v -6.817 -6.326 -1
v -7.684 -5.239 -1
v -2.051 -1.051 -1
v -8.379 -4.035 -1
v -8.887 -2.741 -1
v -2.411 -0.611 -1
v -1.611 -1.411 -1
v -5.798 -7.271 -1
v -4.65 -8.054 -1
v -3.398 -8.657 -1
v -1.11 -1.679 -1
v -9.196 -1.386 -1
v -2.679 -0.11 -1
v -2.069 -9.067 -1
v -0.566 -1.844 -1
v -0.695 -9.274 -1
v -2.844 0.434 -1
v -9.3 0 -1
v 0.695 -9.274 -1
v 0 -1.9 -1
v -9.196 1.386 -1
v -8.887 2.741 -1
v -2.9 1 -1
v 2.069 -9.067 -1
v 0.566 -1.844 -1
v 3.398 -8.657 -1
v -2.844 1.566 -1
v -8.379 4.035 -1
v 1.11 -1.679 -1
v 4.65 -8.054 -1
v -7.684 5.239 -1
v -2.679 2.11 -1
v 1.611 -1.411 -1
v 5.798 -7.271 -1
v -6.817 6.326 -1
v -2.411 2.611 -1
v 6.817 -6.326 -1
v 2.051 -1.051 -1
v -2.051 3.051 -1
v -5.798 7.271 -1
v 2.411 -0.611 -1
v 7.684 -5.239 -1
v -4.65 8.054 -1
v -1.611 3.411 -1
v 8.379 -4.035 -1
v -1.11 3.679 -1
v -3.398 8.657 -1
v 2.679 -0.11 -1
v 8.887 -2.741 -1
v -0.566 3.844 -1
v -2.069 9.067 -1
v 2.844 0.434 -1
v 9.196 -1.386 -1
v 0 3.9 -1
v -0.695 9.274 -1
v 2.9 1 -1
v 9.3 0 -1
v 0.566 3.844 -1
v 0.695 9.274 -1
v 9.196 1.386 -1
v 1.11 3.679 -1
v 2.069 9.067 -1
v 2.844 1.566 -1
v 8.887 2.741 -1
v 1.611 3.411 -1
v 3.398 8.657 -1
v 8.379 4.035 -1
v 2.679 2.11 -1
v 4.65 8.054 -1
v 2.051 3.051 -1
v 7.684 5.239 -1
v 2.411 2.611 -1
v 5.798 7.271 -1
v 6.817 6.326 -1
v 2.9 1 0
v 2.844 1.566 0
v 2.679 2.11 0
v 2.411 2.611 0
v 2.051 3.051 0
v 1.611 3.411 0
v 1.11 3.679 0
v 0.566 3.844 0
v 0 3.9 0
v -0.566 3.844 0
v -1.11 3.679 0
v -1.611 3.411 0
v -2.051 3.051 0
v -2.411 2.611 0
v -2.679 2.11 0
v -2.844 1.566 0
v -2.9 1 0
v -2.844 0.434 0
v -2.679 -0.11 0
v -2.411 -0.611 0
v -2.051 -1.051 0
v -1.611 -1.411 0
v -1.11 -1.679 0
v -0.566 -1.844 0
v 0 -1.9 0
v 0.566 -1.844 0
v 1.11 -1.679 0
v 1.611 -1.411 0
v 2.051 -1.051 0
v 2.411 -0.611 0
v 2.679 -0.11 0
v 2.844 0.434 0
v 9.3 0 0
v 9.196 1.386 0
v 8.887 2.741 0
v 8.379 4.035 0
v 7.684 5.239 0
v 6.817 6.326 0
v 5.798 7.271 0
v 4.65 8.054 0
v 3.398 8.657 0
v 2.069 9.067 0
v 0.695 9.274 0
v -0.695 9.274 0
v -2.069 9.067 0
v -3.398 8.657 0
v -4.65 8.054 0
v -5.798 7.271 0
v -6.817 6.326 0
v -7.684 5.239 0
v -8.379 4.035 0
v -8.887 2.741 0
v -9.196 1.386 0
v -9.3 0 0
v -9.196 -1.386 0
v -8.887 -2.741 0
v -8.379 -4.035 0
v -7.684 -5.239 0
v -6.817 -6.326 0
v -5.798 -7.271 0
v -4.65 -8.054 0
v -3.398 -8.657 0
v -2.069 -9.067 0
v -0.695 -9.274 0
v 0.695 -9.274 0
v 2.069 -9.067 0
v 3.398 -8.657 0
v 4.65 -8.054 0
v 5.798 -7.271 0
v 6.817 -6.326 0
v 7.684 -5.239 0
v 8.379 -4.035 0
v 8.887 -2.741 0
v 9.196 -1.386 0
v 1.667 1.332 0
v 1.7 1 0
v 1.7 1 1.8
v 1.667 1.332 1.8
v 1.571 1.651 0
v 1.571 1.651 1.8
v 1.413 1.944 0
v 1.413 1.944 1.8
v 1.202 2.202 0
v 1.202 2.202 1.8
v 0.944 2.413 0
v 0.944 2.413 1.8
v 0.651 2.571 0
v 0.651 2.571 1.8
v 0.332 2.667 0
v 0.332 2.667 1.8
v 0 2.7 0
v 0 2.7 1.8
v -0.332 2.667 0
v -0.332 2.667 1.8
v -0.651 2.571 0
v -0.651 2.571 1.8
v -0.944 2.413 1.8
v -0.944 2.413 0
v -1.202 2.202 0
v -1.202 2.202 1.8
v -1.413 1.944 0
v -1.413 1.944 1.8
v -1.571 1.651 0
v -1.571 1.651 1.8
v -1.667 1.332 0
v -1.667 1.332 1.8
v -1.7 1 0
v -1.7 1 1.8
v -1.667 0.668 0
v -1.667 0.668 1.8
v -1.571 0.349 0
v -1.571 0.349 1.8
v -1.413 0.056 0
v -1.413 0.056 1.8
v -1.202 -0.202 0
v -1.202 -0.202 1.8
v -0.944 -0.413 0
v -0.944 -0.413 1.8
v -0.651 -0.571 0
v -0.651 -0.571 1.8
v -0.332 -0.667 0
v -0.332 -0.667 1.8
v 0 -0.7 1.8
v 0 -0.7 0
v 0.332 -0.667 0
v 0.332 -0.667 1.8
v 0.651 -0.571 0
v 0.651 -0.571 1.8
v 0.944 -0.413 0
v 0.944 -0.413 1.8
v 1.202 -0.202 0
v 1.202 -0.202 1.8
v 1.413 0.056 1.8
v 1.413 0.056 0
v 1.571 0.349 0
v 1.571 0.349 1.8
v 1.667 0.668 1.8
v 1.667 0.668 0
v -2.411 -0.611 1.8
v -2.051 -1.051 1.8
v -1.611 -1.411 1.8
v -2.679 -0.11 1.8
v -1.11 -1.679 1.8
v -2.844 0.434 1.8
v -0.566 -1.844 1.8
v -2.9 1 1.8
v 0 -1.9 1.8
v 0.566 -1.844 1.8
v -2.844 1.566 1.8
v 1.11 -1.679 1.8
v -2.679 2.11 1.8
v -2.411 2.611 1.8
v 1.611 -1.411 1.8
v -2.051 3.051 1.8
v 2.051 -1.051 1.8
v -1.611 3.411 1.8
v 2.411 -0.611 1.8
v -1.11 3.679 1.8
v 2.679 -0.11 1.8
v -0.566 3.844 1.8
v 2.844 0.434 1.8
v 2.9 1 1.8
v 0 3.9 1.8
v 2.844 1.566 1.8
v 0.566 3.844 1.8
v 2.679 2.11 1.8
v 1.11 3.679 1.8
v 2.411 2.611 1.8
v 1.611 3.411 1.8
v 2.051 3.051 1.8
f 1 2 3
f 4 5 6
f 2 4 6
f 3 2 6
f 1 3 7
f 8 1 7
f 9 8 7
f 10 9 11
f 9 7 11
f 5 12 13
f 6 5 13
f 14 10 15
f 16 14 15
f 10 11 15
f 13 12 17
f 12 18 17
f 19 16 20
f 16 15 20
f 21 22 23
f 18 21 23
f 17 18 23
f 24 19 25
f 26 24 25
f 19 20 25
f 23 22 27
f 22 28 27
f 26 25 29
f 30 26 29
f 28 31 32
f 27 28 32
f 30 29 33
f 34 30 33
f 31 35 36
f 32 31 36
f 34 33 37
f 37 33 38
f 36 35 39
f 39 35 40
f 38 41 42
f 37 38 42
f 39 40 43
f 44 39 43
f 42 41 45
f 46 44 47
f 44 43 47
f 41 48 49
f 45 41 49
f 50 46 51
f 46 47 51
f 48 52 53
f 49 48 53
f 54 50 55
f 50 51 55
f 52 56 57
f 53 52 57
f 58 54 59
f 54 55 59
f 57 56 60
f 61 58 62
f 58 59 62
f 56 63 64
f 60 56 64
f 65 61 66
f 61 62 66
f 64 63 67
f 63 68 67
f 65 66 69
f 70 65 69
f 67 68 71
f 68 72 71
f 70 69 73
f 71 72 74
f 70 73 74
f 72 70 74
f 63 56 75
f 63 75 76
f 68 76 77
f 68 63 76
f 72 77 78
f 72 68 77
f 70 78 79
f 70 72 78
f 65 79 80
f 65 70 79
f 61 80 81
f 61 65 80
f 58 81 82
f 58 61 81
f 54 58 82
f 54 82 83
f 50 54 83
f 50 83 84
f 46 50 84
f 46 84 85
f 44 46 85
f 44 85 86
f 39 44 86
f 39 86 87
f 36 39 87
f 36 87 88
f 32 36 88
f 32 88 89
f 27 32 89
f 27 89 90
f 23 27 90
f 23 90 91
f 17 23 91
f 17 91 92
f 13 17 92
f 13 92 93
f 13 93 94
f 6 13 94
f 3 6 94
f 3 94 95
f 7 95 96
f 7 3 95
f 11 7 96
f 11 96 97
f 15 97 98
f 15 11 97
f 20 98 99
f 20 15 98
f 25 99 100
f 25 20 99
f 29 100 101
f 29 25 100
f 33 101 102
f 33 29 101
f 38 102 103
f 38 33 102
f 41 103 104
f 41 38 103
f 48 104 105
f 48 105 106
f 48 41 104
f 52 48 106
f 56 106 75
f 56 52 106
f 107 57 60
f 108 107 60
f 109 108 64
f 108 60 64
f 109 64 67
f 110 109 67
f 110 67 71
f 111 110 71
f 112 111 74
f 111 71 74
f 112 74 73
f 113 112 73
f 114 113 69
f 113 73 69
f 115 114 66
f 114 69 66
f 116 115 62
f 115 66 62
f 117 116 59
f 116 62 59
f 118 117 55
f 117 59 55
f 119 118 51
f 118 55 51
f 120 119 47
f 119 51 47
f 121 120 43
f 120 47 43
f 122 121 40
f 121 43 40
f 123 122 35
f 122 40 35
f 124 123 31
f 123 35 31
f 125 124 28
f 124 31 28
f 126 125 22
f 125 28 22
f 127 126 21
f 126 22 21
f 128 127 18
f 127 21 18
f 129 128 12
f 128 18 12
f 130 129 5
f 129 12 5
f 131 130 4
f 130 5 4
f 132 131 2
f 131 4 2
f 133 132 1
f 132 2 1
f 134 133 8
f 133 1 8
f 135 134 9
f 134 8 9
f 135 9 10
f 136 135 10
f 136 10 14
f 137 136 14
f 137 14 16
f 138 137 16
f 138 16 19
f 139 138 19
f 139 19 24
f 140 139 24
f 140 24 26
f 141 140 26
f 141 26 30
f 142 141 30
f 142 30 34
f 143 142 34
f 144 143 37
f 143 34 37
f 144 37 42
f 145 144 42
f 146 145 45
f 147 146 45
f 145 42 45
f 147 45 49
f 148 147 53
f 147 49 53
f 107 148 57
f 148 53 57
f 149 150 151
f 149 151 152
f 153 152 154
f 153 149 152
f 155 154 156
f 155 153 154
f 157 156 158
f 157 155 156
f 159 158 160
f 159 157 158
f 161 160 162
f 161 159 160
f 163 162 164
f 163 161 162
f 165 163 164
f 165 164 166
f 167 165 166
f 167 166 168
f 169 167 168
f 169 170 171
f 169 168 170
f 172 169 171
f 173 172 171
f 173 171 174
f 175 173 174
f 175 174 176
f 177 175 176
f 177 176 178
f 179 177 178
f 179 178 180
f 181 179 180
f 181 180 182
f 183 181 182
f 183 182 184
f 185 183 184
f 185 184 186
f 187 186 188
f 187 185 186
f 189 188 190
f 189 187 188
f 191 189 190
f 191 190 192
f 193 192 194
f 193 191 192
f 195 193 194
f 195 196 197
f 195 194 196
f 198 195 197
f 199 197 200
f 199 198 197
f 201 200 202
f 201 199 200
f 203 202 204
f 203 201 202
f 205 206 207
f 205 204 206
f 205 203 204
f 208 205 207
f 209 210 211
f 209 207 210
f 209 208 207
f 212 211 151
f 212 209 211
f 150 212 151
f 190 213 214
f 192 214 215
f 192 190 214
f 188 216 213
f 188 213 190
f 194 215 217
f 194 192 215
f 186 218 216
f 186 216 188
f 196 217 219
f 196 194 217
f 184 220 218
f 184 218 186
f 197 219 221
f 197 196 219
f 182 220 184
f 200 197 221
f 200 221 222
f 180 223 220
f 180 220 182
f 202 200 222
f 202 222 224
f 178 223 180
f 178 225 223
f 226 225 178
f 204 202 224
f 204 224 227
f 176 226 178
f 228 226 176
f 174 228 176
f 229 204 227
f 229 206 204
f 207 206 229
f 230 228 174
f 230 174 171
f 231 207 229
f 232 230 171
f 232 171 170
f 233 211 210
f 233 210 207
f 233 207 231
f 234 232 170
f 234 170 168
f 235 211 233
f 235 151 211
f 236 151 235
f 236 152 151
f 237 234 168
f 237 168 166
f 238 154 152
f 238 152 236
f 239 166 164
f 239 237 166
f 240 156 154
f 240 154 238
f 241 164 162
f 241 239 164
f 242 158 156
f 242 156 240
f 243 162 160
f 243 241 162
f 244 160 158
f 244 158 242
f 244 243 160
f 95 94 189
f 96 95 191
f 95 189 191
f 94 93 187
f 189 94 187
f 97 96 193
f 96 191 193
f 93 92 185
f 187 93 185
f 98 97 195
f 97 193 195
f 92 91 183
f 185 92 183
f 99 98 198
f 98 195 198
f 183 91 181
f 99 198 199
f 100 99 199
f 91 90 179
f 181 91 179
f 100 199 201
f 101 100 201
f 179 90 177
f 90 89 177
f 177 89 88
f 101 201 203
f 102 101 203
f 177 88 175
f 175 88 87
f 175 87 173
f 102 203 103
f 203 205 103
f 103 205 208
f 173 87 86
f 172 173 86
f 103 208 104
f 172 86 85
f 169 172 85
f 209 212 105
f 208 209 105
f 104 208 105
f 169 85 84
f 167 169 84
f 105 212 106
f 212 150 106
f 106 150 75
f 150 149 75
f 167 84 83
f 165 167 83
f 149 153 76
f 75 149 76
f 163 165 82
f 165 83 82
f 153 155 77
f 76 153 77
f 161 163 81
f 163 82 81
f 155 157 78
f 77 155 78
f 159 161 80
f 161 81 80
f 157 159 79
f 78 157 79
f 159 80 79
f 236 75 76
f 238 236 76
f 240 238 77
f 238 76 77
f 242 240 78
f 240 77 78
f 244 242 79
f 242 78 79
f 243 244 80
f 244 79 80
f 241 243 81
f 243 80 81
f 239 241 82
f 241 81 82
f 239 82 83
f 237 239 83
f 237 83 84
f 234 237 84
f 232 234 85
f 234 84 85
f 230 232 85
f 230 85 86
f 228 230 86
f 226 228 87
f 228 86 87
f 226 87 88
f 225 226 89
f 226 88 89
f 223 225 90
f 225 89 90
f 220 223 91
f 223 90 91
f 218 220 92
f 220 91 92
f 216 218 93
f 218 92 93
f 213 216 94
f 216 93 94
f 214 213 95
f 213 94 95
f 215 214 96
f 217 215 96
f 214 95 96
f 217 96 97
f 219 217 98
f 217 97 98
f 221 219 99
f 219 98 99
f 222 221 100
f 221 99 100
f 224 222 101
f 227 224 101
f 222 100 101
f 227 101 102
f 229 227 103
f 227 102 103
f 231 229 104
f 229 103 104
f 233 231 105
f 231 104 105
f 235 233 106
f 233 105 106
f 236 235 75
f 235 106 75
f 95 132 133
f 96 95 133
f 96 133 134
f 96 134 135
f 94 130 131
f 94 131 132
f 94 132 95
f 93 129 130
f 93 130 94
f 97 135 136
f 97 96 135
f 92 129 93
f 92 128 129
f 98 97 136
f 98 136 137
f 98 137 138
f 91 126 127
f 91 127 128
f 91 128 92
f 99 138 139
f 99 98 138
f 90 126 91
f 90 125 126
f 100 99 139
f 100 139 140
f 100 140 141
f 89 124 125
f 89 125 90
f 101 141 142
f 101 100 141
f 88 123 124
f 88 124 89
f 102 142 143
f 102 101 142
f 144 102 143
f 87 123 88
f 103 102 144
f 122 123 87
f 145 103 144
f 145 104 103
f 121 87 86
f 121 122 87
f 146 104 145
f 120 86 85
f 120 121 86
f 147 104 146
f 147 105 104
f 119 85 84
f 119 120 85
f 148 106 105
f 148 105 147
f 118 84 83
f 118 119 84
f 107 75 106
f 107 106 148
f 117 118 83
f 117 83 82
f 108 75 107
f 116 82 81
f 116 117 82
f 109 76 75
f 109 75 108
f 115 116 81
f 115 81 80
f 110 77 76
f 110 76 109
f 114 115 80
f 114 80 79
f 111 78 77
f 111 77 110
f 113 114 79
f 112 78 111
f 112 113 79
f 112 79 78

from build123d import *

# Parameters (mm, degrees)
CYLINDER005_R     = 2
CYLINDER005_DEPTH = 10
CYLINDER004_R     = 1.7
CYLINDER004_DEPTH = 10
CYLINDER003_R     = 2.9
CYLINDER003_DEPTH = 7.8
CYLINDER_R        = 9.3
CYLINDER_DEPTH    = 1
CYLINDER002_R     = 1.7
CYLINDER002_DEPTH = 6
CYLINDER001_R     = 2.9
CYLINDER001_DEPTH = 1.8


with BuildPart() as cilindro005:
    # Cylinder005 → Cylinder005 (new body)
    with BuildSketch(Plane(origin=(0, 1, -4), x_dir=(1, 0, 0), z_dir=(0, 0, 1))):
        Circle(CYLINDER005_R)
    extrude(amount=CYLINDER005_DEPTH)


with BuildPart() as cilindro004:
    # Cylinder004 → Cylinder004 (new body)
    with BuildSketch(Plane.XY.offset(-3)):
        Circle(CYLINDER004_R)
    extrude(amount=CYLINDER004_DEPTH)


with BuildPart() as cut001:
    # Cylinder003 → Cylinder003 (new body)
    with BuildSketch(Plane.XY):
        Circle(CYLINDER003_R)
    extrude(amount=CYLINDER003_DEPTH)

    # Cut001: cut Cilindro004
    add(cilindro004.part, mode=Mode.SUBTRACT)


with BuildPart() as cut001_1:
    # Cut001 placement: moved
    add(cut001.part.moved(Location((0, 1, -4))))


with BuildPart() as cut003:
    # Cylinder → Cylinder (new body)
    with BuildSketch(Plane.XY.offset(-1)):
        Circle(CYLINDER_R)
    extrude(amount=CYLINDER_DEPTH)

    # Cut002: cut Cut001
    add(cut001_1.part, mode=Mode.SUBTRACT)

    # Cut003: cut Cilindro005
    add(cilindro005.part, mode=Mode.SUBTRACT)


with BuildPart() as cilindro002:
    # Cylinder002 → Cylinder002 (new body)
    with BuildSketch(Plane.XY.offset(-3)):
        Circle(CYLINDER002_R)
    extrude(amount=CYLINDER002_DEPTH)


with BuildPart() as fusion:
    # Cylinder001 → Cylinder001 (new body)
    with BuildSketch(Plane.XY):
        Circle(CYLINDER001_R)
    extrude(amount=CYLINDER001_DEPTH)

    # Cut: cut Cilindro002
    add(cilindro002.part, mode=Mode.SUBTRACT)


with BuildPart() as fusion_1:
    # Cut placement: moved
    add(fusion.part.moved(Location((0, 1, 0))))

    # Fusion: union Cut003
    add(cut003.part)


solid = fusion_1.part
